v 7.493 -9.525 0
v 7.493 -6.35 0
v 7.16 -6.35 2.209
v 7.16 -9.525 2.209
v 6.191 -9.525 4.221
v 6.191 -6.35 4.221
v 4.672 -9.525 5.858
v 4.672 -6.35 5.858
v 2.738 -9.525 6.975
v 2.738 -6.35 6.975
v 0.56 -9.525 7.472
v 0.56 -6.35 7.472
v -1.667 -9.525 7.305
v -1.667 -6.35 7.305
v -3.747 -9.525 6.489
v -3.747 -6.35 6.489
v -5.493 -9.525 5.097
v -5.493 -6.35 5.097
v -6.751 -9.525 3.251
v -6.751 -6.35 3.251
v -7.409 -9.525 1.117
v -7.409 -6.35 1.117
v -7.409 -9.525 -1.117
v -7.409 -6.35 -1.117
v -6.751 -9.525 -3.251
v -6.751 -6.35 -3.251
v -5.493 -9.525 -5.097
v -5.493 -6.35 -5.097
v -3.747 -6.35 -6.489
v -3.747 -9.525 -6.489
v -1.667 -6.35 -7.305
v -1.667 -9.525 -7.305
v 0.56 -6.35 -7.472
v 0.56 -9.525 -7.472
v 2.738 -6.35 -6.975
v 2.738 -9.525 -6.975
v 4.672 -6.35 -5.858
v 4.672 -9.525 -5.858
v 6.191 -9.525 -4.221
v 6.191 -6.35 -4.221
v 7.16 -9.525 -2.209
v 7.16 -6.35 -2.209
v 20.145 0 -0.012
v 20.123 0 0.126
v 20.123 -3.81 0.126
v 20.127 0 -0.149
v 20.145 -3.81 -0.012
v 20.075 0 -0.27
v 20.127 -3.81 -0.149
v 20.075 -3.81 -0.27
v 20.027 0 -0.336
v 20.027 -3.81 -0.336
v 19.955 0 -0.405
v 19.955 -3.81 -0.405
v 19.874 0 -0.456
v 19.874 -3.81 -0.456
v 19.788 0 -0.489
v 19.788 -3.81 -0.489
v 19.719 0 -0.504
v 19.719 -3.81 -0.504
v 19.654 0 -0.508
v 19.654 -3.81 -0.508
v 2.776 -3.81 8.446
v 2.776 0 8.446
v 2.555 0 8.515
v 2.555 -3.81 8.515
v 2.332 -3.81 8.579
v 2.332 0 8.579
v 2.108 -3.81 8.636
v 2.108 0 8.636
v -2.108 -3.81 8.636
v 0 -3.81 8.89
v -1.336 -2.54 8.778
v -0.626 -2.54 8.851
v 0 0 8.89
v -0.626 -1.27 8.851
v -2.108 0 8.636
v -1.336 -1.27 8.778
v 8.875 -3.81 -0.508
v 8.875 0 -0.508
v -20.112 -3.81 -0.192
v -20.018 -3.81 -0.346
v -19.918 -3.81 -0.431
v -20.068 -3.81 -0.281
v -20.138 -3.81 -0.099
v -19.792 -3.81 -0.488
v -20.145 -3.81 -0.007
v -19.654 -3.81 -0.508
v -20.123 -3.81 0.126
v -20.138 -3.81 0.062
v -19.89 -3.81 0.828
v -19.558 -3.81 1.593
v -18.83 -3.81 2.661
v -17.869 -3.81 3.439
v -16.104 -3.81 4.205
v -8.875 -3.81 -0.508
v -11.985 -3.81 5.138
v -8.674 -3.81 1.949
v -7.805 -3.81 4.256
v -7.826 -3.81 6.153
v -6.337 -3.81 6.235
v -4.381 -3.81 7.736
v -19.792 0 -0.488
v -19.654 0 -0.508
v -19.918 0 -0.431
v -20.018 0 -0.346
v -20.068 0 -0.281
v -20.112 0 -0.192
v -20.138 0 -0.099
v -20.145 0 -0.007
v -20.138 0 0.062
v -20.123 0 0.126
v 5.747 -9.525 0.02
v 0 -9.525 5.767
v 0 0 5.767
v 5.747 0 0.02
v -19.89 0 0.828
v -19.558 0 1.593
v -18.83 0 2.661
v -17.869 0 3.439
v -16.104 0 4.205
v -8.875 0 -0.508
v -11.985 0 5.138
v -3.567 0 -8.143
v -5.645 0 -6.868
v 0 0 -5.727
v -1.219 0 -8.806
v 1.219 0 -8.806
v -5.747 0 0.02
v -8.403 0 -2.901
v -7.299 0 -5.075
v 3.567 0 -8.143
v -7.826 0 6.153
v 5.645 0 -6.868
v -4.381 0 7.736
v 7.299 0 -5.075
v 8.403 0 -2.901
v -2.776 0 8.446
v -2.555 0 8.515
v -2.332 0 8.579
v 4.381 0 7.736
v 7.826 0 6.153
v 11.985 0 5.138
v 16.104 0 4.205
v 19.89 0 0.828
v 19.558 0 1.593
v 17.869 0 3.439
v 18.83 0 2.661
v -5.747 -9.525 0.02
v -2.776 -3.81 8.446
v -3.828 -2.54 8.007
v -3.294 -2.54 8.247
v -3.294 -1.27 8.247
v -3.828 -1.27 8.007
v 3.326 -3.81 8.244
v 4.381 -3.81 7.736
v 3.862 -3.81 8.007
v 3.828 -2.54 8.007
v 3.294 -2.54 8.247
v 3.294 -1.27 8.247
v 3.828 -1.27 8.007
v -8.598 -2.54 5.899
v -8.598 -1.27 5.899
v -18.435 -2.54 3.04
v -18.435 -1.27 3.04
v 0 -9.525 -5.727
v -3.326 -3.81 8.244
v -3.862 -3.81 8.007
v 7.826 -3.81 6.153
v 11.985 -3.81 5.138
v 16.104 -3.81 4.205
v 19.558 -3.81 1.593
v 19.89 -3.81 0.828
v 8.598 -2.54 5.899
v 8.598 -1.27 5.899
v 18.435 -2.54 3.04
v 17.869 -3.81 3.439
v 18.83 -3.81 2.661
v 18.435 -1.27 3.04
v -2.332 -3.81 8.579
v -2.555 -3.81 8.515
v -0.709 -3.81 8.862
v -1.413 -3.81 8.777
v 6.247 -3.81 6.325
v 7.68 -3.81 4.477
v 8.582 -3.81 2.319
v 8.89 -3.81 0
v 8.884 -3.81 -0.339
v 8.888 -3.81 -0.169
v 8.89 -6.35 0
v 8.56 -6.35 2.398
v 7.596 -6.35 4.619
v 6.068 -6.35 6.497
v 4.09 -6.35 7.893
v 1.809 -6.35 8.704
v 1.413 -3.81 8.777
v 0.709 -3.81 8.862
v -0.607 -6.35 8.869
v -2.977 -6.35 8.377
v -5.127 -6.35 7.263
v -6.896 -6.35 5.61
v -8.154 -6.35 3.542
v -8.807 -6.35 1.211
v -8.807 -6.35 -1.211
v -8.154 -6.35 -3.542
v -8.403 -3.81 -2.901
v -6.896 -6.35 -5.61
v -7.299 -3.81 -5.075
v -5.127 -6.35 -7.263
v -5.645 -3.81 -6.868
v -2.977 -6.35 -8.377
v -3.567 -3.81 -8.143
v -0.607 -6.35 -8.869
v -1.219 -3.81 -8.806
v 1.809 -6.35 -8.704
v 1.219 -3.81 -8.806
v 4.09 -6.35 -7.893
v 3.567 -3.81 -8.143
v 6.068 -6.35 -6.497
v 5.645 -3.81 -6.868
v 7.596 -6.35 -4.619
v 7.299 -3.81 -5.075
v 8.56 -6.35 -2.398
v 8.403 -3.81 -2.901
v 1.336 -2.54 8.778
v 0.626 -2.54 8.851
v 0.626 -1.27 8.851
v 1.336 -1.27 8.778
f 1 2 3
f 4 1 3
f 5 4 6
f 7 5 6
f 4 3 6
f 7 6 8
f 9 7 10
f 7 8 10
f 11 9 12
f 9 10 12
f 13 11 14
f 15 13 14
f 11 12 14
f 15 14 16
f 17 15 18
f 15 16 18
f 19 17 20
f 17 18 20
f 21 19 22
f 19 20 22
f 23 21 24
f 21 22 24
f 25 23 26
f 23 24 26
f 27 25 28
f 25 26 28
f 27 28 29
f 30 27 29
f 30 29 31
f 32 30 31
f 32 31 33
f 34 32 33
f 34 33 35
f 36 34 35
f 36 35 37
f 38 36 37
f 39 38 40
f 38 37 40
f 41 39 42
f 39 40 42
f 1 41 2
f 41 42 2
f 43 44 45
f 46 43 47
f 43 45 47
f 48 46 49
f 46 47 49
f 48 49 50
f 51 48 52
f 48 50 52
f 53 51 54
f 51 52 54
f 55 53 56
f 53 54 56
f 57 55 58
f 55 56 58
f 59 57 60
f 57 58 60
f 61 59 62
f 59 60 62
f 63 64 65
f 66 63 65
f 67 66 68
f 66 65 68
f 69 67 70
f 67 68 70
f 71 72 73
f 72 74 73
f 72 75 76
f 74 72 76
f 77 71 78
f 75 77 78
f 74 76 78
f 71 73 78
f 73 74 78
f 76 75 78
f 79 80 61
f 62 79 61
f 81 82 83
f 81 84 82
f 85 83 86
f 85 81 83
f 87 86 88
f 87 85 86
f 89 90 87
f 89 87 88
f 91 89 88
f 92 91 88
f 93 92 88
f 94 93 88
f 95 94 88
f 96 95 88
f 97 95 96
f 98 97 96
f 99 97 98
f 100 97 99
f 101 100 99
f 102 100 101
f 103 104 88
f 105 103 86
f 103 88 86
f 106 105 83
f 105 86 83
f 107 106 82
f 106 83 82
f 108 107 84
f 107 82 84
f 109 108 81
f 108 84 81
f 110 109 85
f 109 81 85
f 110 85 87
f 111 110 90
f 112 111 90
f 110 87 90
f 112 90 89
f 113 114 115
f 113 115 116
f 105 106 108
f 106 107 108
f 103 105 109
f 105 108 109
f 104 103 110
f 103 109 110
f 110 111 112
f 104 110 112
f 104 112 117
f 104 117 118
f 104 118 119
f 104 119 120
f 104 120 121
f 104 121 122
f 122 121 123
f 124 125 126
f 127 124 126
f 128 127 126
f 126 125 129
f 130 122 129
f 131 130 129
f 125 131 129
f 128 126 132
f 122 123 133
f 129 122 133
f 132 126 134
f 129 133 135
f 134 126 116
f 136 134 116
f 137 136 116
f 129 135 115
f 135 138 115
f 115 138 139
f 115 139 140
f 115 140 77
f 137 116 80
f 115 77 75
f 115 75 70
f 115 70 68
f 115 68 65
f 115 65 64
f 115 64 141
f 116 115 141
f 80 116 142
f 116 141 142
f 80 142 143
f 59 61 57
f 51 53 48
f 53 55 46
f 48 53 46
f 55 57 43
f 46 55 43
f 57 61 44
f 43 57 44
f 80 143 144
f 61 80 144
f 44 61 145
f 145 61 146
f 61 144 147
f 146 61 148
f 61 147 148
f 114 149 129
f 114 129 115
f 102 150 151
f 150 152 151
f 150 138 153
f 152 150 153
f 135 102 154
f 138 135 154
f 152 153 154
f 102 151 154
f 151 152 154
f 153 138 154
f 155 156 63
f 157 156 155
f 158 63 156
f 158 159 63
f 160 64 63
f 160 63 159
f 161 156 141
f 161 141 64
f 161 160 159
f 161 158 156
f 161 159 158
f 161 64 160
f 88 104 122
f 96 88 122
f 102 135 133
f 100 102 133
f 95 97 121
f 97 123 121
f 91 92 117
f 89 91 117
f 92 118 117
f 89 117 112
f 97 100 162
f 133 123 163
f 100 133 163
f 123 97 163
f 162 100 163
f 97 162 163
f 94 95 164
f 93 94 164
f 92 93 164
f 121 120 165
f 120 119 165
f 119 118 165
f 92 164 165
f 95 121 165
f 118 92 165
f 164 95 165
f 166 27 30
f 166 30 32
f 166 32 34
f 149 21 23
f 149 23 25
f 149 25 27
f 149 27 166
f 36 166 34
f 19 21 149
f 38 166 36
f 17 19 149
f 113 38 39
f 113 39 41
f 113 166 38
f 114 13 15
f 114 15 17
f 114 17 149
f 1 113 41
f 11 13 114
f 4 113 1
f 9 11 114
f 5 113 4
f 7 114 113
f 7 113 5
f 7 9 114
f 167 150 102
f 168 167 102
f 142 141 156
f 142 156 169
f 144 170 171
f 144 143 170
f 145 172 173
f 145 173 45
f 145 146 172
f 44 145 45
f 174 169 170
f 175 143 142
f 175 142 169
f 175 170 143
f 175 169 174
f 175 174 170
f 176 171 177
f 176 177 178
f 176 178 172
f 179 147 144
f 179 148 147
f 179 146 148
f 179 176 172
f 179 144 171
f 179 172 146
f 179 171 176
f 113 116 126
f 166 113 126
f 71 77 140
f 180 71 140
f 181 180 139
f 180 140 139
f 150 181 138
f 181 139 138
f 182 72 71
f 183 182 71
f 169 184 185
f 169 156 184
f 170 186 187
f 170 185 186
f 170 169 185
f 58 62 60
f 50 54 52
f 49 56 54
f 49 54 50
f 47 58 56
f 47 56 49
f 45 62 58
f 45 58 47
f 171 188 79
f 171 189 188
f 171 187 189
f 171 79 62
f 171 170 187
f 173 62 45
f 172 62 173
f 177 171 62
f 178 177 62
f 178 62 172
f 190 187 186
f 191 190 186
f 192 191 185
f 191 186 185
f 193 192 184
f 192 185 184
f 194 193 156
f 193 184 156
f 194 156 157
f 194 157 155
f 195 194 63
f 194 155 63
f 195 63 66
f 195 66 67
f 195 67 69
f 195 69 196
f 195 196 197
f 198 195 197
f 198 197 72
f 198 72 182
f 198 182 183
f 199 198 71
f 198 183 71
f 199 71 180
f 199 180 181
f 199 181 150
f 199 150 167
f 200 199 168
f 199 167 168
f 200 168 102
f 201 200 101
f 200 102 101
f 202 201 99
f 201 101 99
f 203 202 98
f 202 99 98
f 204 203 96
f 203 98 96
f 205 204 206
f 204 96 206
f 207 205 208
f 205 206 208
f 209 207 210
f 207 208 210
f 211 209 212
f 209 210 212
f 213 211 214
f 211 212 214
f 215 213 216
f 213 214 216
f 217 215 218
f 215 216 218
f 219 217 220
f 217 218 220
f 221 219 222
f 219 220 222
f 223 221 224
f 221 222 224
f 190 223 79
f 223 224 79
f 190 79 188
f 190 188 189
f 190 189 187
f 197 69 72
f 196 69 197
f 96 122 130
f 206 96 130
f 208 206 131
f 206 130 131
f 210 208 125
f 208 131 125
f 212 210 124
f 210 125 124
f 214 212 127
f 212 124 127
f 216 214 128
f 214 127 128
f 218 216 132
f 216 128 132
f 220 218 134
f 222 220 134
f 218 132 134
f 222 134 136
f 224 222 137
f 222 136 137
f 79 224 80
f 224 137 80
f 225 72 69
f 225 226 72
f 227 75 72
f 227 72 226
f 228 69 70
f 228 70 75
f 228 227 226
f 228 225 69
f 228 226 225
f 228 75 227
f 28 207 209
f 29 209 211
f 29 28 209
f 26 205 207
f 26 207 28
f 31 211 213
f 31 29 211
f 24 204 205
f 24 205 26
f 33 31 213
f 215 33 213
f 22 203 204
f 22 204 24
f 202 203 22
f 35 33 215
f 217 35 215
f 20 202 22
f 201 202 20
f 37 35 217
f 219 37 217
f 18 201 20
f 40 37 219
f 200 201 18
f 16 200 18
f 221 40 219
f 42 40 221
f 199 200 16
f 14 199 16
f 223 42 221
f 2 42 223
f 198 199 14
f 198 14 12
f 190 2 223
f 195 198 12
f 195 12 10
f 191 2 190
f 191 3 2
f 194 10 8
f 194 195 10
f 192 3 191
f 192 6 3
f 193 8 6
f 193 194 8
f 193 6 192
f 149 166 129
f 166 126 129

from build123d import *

# Parameters (mm, degrees)
F1_DEPTH = 3.81
F2_R     = 8.89
F3_DEPTH = 2.54
F4_R     = 7.493
F5_DEPTH = 3.175
F6_R     = 0.4911819864


with BuildPart() as f1:
    # F0 (on Front) → F1 (new body)
    with BuildSketch(Plane.XZ):
        with BuildLine():
            ThreePointArc((8.8754738465, -0.508), (8.8863677196, -0.2541038219), (8.89, 0))
            ThreePointArc((8.89, 0), (7.6804215502, 4.4769660275), (4.3808380628, 7.7356549734))
            add(Edge.make_bspline(
                [(2.7757389763, 8.4455534535), (3.2888417453, 8.2703062234), (3.8159102337, 8.0198976132), (4.3808380628, 7.7356549734)],
                knots=[0.1783179795, 0.1783179795, 0.1783179795, 0.1783179795, 0.2655314771, 0.2655314771, 0.2655314771, 0.2655314771], degree=3))
            ThreePointArc((2.7757389763, 8.4455534535), (2.4438853282, 8.5474864435), (2.1083049646, 8.6363852494))
            add(Edge.make_bspline(
                [(0, 8.89), (0.577506035, 8.8570186599), (1.3119112895, 8.8227589155), (2.1083049646, 8.6363852494)],
                knots=[0, 0, 0, 0, 0.1399319156, 0.1399319156, 0.1399319156, 0.1399319156], degree=3))
            add(Edge.make_bspline(
                [(0, 8.89), (-0.577506035, 8.8570186599), (-1.3119112895, 8.8227589155), (-2.1083049646, 8.6363852494)],
                knots=[0, 0, 0, 0, 0.1399319156, 0.1399319156, 0.1399319156, 0.1399319156], degree=3))
            ThreePointArc((-2.1083049646, 8.6363852494), (-2.4438853282, 8.5474864435), (-2.7757389763, 8.4455534535))
            add(Edge.make_bspline(
                [(-2.7757389763, 8.4455534535), (-3.2888417453, 8.2703062234), (-3.8159102337, 8.0198976132), (-4.3808380628, 7.7356549734)],
                knots=[0.1783179795, 0.1783179795, 0.1783179795, 0.1783179795, 0.2655314771, 0.2655314771, 0.2655314771, 0.2655314771], degree=3))
            ThreePointArc((-4.3808380628, 7.7356549734), (-7.8052490793, 4.255606515), (-8.8754738465, -0.508))
            Line((-8.8754738465, -0.508), (-5.2194662387, -0.508))
            Line((-5.2194662387, -0.508), (-5.7473639175, 0.0198976788))
            Line((-5.7473639175, 0.0198976788), (0, 5.7672615963))
            Line((0, 5.7672615963), (5.7473639175, 0.0198976788))
            Line((5.7473639175, 0.0198976788), (5.2194662387, -0.508))
            Line((5.2194662387, -0.508), (8.8754738465, -0.508))
        make_face()
        with BuildLine():
            ThreePointArc((4.3808380628, 7.7356549734), (7.6804215502, 4.4769660275), (8.89, 0))
            ThreePointArc((8.89, 0), (8.8863677196, -0.2541038219), (8.8754738465, -0.508))
            Line((8.8754738465, -0.508), (20.32, -0.508))
            add(Edge.make_bspline(
                [(4.3808380628, 7.7356549734), (5.5525412949, 7.1461141461), (9.398567587, 5.0276978273), (19.2176653381, 4.6545545686), (20.0494547253, 0.2736910266), (20.32, -0.508)],
                knots=[0.2655314771, 0.2655314771, 0.2655314771, 0.2655314771, 0.4464188962, 0.7868227895, 1, 1, 1, 1], degree=3))
        make_face()
        with BuildLine():
            ThreePointArc((-8.8754738465, -0.508), (0, -8.89), (8.8754738465, -0.508))
            Line((8.8754738465, -0.508), (5.2194662387, -0.508))
            Line((5.2194662387, -0.508), (0, -5.7274662387))
            Line((0, -5.7274662387), (-5.2194662387, -0.508))
            Line((-5.2194662387, -0.508), (-8.8754738465, -0.508))
        make_face()
        with BuildLine():
            Line((-20.32, -0.508), (-8.8754738465, -0.508))
            ThreePointArc((-8.8754738465, -0.508), (-7.8052490793, 4.255606515), (-4.3808380628, 7.7356549734))
            add(Edge.make_bspline(
                [(-4.3808380628, 7.7356549734), (-5.5525412949, 7.1461141461), (-9.398567587, 5.0276978273), (-19.2176653381, 4.6545545686), (-20.0494547253, 0.2736910266), (-20.32, -0.508)],
                knots=[0.2655314771, 0.2655314771, 0.2655314771, 0.2655314771, 0.4464188962, 0.7868227895, 1, 1, 1, 1], degree=3))
        make_face()
    extrude(amount=F1_DEPTH)

    # F2 (on face) → F3 (join)
    with BuildSketch(Plane.XZ.offset(3.81)):
        Circle(F2_R)
        Polygon((-5.7473639175, 0.0198976788), (0, 5.7672615963), (5.7473639175, 0.0198976788), (0, -5.7274662387), align=None, mode=Mode.SUBTRACT)
    extrude(amount=F3_DEPTH)

    # F4 (on face) → F5 (join)
    with BuildSketch(Plane.XZ.offset(6.35)):
        Circle(F4_R)
        Polygon((0, -5.7274662387), (-5.7473639175, 0.0198976788), (0, 5.7672615963), (5.7473639175, 0.0198976788), align=None, mode=Mode.SUBTRACT)
    extrude(amount=F5_DEPTH)

    # F6
    f6_edges = [f1.edges().sort_by_distance(p)[0] for p in [
        (20.32, -1.905, -0.508),
        (-20.32, -1.905, -0.508),
    ]]
    fillet(f6_edges, radius=F6_R)


solid = f1.part
